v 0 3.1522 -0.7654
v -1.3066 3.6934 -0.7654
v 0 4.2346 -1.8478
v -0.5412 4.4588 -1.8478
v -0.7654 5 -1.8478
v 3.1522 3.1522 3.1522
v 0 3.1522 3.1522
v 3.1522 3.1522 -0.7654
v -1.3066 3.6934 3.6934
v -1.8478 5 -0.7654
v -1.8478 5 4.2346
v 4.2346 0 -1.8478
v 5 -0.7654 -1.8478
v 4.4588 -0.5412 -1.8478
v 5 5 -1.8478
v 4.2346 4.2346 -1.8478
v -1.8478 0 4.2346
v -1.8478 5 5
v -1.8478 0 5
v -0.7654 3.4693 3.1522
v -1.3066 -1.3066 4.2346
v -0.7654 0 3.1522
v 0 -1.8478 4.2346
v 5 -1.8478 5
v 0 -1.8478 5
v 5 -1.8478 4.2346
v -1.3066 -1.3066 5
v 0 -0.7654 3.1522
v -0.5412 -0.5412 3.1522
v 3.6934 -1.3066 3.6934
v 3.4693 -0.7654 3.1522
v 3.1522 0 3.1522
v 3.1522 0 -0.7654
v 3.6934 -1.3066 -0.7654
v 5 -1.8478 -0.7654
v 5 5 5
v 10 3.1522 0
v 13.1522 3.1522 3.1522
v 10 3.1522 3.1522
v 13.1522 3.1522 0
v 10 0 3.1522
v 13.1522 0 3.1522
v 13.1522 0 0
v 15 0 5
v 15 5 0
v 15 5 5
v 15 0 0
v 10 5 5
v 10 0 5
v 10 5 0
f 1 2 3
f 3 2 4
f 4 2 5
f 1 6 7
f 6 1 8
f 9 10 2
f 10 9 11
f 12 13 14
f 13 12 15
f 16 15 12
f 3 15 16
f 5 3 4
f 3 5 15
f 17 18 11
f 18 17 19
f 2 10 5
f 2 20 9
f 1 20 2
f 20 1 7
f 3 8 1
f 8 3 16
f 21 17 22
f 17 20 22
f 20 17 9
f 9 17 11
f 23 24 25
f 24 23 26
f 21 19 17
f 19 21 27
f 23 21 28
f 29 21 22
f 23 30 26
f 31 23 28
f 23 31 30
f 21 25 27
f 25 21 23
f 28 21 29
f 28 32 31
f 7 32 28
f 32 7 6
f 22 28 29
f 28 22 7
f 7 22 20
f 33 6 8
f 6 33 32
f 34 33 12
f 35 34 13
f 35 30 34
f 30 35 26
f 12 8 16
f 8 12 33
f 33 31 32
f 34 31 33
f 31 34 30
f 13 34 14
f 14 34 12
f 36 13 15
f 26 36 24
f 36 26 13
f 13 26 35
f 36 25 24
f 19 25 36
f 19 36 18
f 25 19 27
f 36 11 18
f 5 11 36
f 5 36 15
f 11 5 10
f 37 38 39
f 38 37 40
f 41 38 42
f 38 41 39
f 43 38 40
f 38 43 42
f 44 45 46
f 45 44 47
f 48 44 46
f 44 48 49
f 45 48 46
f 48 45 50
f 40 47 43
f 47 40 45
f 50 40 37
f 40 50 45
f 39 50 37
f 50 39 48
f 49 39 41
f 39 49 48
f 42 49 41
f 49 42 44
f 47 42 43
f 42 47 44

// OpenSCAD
// Create a shell around the first child, based on its void in the second child.
// If the second child completely encloses the first, then the shell will have a
// solid exterior but be hollow. If the second child cuts through the first
// child, then the shell is open. This can be a quite slow operation and the
// resulting preview may have lots of rendering artifacts.
//
// http://forum.openscad.org/I-have-a-suggestion-shell-td1358.html
// https://jweoblog.com/?p=644

module create_shell(shell_thickness=2, fn=8) {
  // Steps:
  // 1: Remove child(0) shaped void from child(1), producing B.
  // 2: Create Minkowski Sum of B and a sphere whose radius is the desired
  //    shell thickness, producing C. The child(0) shaped void is a smaller
  //    in C by the shell_thickness.
  // 3: Intersect C and child(0), producing a shell (hollow object) whose
  //    outer surface matches that of child(0).

  // Step 3: intersect child(0) and the enlarged child(1)
  intersection() {
    children(0);

    // Step 2: Enlarge the hole in child(1)
    minkowski() {
      // Step 1: Remove child(0) shaped void from child(1).
      difference() {
        children(1);
        children(0);
      }

      sphere(r=shell_thickness, center=true, $fn=fn);
    }
  };
}


create_shell() {
  cube(size=10, center=true);
  cube(size=10, center=false);
};

translate([10, 0, 0])
  intersection() {
    create_shell() {
      cube(size=10, center=true);
      cube(size=20, center=true);
    }
    cube(size=10, center=false);
  };
